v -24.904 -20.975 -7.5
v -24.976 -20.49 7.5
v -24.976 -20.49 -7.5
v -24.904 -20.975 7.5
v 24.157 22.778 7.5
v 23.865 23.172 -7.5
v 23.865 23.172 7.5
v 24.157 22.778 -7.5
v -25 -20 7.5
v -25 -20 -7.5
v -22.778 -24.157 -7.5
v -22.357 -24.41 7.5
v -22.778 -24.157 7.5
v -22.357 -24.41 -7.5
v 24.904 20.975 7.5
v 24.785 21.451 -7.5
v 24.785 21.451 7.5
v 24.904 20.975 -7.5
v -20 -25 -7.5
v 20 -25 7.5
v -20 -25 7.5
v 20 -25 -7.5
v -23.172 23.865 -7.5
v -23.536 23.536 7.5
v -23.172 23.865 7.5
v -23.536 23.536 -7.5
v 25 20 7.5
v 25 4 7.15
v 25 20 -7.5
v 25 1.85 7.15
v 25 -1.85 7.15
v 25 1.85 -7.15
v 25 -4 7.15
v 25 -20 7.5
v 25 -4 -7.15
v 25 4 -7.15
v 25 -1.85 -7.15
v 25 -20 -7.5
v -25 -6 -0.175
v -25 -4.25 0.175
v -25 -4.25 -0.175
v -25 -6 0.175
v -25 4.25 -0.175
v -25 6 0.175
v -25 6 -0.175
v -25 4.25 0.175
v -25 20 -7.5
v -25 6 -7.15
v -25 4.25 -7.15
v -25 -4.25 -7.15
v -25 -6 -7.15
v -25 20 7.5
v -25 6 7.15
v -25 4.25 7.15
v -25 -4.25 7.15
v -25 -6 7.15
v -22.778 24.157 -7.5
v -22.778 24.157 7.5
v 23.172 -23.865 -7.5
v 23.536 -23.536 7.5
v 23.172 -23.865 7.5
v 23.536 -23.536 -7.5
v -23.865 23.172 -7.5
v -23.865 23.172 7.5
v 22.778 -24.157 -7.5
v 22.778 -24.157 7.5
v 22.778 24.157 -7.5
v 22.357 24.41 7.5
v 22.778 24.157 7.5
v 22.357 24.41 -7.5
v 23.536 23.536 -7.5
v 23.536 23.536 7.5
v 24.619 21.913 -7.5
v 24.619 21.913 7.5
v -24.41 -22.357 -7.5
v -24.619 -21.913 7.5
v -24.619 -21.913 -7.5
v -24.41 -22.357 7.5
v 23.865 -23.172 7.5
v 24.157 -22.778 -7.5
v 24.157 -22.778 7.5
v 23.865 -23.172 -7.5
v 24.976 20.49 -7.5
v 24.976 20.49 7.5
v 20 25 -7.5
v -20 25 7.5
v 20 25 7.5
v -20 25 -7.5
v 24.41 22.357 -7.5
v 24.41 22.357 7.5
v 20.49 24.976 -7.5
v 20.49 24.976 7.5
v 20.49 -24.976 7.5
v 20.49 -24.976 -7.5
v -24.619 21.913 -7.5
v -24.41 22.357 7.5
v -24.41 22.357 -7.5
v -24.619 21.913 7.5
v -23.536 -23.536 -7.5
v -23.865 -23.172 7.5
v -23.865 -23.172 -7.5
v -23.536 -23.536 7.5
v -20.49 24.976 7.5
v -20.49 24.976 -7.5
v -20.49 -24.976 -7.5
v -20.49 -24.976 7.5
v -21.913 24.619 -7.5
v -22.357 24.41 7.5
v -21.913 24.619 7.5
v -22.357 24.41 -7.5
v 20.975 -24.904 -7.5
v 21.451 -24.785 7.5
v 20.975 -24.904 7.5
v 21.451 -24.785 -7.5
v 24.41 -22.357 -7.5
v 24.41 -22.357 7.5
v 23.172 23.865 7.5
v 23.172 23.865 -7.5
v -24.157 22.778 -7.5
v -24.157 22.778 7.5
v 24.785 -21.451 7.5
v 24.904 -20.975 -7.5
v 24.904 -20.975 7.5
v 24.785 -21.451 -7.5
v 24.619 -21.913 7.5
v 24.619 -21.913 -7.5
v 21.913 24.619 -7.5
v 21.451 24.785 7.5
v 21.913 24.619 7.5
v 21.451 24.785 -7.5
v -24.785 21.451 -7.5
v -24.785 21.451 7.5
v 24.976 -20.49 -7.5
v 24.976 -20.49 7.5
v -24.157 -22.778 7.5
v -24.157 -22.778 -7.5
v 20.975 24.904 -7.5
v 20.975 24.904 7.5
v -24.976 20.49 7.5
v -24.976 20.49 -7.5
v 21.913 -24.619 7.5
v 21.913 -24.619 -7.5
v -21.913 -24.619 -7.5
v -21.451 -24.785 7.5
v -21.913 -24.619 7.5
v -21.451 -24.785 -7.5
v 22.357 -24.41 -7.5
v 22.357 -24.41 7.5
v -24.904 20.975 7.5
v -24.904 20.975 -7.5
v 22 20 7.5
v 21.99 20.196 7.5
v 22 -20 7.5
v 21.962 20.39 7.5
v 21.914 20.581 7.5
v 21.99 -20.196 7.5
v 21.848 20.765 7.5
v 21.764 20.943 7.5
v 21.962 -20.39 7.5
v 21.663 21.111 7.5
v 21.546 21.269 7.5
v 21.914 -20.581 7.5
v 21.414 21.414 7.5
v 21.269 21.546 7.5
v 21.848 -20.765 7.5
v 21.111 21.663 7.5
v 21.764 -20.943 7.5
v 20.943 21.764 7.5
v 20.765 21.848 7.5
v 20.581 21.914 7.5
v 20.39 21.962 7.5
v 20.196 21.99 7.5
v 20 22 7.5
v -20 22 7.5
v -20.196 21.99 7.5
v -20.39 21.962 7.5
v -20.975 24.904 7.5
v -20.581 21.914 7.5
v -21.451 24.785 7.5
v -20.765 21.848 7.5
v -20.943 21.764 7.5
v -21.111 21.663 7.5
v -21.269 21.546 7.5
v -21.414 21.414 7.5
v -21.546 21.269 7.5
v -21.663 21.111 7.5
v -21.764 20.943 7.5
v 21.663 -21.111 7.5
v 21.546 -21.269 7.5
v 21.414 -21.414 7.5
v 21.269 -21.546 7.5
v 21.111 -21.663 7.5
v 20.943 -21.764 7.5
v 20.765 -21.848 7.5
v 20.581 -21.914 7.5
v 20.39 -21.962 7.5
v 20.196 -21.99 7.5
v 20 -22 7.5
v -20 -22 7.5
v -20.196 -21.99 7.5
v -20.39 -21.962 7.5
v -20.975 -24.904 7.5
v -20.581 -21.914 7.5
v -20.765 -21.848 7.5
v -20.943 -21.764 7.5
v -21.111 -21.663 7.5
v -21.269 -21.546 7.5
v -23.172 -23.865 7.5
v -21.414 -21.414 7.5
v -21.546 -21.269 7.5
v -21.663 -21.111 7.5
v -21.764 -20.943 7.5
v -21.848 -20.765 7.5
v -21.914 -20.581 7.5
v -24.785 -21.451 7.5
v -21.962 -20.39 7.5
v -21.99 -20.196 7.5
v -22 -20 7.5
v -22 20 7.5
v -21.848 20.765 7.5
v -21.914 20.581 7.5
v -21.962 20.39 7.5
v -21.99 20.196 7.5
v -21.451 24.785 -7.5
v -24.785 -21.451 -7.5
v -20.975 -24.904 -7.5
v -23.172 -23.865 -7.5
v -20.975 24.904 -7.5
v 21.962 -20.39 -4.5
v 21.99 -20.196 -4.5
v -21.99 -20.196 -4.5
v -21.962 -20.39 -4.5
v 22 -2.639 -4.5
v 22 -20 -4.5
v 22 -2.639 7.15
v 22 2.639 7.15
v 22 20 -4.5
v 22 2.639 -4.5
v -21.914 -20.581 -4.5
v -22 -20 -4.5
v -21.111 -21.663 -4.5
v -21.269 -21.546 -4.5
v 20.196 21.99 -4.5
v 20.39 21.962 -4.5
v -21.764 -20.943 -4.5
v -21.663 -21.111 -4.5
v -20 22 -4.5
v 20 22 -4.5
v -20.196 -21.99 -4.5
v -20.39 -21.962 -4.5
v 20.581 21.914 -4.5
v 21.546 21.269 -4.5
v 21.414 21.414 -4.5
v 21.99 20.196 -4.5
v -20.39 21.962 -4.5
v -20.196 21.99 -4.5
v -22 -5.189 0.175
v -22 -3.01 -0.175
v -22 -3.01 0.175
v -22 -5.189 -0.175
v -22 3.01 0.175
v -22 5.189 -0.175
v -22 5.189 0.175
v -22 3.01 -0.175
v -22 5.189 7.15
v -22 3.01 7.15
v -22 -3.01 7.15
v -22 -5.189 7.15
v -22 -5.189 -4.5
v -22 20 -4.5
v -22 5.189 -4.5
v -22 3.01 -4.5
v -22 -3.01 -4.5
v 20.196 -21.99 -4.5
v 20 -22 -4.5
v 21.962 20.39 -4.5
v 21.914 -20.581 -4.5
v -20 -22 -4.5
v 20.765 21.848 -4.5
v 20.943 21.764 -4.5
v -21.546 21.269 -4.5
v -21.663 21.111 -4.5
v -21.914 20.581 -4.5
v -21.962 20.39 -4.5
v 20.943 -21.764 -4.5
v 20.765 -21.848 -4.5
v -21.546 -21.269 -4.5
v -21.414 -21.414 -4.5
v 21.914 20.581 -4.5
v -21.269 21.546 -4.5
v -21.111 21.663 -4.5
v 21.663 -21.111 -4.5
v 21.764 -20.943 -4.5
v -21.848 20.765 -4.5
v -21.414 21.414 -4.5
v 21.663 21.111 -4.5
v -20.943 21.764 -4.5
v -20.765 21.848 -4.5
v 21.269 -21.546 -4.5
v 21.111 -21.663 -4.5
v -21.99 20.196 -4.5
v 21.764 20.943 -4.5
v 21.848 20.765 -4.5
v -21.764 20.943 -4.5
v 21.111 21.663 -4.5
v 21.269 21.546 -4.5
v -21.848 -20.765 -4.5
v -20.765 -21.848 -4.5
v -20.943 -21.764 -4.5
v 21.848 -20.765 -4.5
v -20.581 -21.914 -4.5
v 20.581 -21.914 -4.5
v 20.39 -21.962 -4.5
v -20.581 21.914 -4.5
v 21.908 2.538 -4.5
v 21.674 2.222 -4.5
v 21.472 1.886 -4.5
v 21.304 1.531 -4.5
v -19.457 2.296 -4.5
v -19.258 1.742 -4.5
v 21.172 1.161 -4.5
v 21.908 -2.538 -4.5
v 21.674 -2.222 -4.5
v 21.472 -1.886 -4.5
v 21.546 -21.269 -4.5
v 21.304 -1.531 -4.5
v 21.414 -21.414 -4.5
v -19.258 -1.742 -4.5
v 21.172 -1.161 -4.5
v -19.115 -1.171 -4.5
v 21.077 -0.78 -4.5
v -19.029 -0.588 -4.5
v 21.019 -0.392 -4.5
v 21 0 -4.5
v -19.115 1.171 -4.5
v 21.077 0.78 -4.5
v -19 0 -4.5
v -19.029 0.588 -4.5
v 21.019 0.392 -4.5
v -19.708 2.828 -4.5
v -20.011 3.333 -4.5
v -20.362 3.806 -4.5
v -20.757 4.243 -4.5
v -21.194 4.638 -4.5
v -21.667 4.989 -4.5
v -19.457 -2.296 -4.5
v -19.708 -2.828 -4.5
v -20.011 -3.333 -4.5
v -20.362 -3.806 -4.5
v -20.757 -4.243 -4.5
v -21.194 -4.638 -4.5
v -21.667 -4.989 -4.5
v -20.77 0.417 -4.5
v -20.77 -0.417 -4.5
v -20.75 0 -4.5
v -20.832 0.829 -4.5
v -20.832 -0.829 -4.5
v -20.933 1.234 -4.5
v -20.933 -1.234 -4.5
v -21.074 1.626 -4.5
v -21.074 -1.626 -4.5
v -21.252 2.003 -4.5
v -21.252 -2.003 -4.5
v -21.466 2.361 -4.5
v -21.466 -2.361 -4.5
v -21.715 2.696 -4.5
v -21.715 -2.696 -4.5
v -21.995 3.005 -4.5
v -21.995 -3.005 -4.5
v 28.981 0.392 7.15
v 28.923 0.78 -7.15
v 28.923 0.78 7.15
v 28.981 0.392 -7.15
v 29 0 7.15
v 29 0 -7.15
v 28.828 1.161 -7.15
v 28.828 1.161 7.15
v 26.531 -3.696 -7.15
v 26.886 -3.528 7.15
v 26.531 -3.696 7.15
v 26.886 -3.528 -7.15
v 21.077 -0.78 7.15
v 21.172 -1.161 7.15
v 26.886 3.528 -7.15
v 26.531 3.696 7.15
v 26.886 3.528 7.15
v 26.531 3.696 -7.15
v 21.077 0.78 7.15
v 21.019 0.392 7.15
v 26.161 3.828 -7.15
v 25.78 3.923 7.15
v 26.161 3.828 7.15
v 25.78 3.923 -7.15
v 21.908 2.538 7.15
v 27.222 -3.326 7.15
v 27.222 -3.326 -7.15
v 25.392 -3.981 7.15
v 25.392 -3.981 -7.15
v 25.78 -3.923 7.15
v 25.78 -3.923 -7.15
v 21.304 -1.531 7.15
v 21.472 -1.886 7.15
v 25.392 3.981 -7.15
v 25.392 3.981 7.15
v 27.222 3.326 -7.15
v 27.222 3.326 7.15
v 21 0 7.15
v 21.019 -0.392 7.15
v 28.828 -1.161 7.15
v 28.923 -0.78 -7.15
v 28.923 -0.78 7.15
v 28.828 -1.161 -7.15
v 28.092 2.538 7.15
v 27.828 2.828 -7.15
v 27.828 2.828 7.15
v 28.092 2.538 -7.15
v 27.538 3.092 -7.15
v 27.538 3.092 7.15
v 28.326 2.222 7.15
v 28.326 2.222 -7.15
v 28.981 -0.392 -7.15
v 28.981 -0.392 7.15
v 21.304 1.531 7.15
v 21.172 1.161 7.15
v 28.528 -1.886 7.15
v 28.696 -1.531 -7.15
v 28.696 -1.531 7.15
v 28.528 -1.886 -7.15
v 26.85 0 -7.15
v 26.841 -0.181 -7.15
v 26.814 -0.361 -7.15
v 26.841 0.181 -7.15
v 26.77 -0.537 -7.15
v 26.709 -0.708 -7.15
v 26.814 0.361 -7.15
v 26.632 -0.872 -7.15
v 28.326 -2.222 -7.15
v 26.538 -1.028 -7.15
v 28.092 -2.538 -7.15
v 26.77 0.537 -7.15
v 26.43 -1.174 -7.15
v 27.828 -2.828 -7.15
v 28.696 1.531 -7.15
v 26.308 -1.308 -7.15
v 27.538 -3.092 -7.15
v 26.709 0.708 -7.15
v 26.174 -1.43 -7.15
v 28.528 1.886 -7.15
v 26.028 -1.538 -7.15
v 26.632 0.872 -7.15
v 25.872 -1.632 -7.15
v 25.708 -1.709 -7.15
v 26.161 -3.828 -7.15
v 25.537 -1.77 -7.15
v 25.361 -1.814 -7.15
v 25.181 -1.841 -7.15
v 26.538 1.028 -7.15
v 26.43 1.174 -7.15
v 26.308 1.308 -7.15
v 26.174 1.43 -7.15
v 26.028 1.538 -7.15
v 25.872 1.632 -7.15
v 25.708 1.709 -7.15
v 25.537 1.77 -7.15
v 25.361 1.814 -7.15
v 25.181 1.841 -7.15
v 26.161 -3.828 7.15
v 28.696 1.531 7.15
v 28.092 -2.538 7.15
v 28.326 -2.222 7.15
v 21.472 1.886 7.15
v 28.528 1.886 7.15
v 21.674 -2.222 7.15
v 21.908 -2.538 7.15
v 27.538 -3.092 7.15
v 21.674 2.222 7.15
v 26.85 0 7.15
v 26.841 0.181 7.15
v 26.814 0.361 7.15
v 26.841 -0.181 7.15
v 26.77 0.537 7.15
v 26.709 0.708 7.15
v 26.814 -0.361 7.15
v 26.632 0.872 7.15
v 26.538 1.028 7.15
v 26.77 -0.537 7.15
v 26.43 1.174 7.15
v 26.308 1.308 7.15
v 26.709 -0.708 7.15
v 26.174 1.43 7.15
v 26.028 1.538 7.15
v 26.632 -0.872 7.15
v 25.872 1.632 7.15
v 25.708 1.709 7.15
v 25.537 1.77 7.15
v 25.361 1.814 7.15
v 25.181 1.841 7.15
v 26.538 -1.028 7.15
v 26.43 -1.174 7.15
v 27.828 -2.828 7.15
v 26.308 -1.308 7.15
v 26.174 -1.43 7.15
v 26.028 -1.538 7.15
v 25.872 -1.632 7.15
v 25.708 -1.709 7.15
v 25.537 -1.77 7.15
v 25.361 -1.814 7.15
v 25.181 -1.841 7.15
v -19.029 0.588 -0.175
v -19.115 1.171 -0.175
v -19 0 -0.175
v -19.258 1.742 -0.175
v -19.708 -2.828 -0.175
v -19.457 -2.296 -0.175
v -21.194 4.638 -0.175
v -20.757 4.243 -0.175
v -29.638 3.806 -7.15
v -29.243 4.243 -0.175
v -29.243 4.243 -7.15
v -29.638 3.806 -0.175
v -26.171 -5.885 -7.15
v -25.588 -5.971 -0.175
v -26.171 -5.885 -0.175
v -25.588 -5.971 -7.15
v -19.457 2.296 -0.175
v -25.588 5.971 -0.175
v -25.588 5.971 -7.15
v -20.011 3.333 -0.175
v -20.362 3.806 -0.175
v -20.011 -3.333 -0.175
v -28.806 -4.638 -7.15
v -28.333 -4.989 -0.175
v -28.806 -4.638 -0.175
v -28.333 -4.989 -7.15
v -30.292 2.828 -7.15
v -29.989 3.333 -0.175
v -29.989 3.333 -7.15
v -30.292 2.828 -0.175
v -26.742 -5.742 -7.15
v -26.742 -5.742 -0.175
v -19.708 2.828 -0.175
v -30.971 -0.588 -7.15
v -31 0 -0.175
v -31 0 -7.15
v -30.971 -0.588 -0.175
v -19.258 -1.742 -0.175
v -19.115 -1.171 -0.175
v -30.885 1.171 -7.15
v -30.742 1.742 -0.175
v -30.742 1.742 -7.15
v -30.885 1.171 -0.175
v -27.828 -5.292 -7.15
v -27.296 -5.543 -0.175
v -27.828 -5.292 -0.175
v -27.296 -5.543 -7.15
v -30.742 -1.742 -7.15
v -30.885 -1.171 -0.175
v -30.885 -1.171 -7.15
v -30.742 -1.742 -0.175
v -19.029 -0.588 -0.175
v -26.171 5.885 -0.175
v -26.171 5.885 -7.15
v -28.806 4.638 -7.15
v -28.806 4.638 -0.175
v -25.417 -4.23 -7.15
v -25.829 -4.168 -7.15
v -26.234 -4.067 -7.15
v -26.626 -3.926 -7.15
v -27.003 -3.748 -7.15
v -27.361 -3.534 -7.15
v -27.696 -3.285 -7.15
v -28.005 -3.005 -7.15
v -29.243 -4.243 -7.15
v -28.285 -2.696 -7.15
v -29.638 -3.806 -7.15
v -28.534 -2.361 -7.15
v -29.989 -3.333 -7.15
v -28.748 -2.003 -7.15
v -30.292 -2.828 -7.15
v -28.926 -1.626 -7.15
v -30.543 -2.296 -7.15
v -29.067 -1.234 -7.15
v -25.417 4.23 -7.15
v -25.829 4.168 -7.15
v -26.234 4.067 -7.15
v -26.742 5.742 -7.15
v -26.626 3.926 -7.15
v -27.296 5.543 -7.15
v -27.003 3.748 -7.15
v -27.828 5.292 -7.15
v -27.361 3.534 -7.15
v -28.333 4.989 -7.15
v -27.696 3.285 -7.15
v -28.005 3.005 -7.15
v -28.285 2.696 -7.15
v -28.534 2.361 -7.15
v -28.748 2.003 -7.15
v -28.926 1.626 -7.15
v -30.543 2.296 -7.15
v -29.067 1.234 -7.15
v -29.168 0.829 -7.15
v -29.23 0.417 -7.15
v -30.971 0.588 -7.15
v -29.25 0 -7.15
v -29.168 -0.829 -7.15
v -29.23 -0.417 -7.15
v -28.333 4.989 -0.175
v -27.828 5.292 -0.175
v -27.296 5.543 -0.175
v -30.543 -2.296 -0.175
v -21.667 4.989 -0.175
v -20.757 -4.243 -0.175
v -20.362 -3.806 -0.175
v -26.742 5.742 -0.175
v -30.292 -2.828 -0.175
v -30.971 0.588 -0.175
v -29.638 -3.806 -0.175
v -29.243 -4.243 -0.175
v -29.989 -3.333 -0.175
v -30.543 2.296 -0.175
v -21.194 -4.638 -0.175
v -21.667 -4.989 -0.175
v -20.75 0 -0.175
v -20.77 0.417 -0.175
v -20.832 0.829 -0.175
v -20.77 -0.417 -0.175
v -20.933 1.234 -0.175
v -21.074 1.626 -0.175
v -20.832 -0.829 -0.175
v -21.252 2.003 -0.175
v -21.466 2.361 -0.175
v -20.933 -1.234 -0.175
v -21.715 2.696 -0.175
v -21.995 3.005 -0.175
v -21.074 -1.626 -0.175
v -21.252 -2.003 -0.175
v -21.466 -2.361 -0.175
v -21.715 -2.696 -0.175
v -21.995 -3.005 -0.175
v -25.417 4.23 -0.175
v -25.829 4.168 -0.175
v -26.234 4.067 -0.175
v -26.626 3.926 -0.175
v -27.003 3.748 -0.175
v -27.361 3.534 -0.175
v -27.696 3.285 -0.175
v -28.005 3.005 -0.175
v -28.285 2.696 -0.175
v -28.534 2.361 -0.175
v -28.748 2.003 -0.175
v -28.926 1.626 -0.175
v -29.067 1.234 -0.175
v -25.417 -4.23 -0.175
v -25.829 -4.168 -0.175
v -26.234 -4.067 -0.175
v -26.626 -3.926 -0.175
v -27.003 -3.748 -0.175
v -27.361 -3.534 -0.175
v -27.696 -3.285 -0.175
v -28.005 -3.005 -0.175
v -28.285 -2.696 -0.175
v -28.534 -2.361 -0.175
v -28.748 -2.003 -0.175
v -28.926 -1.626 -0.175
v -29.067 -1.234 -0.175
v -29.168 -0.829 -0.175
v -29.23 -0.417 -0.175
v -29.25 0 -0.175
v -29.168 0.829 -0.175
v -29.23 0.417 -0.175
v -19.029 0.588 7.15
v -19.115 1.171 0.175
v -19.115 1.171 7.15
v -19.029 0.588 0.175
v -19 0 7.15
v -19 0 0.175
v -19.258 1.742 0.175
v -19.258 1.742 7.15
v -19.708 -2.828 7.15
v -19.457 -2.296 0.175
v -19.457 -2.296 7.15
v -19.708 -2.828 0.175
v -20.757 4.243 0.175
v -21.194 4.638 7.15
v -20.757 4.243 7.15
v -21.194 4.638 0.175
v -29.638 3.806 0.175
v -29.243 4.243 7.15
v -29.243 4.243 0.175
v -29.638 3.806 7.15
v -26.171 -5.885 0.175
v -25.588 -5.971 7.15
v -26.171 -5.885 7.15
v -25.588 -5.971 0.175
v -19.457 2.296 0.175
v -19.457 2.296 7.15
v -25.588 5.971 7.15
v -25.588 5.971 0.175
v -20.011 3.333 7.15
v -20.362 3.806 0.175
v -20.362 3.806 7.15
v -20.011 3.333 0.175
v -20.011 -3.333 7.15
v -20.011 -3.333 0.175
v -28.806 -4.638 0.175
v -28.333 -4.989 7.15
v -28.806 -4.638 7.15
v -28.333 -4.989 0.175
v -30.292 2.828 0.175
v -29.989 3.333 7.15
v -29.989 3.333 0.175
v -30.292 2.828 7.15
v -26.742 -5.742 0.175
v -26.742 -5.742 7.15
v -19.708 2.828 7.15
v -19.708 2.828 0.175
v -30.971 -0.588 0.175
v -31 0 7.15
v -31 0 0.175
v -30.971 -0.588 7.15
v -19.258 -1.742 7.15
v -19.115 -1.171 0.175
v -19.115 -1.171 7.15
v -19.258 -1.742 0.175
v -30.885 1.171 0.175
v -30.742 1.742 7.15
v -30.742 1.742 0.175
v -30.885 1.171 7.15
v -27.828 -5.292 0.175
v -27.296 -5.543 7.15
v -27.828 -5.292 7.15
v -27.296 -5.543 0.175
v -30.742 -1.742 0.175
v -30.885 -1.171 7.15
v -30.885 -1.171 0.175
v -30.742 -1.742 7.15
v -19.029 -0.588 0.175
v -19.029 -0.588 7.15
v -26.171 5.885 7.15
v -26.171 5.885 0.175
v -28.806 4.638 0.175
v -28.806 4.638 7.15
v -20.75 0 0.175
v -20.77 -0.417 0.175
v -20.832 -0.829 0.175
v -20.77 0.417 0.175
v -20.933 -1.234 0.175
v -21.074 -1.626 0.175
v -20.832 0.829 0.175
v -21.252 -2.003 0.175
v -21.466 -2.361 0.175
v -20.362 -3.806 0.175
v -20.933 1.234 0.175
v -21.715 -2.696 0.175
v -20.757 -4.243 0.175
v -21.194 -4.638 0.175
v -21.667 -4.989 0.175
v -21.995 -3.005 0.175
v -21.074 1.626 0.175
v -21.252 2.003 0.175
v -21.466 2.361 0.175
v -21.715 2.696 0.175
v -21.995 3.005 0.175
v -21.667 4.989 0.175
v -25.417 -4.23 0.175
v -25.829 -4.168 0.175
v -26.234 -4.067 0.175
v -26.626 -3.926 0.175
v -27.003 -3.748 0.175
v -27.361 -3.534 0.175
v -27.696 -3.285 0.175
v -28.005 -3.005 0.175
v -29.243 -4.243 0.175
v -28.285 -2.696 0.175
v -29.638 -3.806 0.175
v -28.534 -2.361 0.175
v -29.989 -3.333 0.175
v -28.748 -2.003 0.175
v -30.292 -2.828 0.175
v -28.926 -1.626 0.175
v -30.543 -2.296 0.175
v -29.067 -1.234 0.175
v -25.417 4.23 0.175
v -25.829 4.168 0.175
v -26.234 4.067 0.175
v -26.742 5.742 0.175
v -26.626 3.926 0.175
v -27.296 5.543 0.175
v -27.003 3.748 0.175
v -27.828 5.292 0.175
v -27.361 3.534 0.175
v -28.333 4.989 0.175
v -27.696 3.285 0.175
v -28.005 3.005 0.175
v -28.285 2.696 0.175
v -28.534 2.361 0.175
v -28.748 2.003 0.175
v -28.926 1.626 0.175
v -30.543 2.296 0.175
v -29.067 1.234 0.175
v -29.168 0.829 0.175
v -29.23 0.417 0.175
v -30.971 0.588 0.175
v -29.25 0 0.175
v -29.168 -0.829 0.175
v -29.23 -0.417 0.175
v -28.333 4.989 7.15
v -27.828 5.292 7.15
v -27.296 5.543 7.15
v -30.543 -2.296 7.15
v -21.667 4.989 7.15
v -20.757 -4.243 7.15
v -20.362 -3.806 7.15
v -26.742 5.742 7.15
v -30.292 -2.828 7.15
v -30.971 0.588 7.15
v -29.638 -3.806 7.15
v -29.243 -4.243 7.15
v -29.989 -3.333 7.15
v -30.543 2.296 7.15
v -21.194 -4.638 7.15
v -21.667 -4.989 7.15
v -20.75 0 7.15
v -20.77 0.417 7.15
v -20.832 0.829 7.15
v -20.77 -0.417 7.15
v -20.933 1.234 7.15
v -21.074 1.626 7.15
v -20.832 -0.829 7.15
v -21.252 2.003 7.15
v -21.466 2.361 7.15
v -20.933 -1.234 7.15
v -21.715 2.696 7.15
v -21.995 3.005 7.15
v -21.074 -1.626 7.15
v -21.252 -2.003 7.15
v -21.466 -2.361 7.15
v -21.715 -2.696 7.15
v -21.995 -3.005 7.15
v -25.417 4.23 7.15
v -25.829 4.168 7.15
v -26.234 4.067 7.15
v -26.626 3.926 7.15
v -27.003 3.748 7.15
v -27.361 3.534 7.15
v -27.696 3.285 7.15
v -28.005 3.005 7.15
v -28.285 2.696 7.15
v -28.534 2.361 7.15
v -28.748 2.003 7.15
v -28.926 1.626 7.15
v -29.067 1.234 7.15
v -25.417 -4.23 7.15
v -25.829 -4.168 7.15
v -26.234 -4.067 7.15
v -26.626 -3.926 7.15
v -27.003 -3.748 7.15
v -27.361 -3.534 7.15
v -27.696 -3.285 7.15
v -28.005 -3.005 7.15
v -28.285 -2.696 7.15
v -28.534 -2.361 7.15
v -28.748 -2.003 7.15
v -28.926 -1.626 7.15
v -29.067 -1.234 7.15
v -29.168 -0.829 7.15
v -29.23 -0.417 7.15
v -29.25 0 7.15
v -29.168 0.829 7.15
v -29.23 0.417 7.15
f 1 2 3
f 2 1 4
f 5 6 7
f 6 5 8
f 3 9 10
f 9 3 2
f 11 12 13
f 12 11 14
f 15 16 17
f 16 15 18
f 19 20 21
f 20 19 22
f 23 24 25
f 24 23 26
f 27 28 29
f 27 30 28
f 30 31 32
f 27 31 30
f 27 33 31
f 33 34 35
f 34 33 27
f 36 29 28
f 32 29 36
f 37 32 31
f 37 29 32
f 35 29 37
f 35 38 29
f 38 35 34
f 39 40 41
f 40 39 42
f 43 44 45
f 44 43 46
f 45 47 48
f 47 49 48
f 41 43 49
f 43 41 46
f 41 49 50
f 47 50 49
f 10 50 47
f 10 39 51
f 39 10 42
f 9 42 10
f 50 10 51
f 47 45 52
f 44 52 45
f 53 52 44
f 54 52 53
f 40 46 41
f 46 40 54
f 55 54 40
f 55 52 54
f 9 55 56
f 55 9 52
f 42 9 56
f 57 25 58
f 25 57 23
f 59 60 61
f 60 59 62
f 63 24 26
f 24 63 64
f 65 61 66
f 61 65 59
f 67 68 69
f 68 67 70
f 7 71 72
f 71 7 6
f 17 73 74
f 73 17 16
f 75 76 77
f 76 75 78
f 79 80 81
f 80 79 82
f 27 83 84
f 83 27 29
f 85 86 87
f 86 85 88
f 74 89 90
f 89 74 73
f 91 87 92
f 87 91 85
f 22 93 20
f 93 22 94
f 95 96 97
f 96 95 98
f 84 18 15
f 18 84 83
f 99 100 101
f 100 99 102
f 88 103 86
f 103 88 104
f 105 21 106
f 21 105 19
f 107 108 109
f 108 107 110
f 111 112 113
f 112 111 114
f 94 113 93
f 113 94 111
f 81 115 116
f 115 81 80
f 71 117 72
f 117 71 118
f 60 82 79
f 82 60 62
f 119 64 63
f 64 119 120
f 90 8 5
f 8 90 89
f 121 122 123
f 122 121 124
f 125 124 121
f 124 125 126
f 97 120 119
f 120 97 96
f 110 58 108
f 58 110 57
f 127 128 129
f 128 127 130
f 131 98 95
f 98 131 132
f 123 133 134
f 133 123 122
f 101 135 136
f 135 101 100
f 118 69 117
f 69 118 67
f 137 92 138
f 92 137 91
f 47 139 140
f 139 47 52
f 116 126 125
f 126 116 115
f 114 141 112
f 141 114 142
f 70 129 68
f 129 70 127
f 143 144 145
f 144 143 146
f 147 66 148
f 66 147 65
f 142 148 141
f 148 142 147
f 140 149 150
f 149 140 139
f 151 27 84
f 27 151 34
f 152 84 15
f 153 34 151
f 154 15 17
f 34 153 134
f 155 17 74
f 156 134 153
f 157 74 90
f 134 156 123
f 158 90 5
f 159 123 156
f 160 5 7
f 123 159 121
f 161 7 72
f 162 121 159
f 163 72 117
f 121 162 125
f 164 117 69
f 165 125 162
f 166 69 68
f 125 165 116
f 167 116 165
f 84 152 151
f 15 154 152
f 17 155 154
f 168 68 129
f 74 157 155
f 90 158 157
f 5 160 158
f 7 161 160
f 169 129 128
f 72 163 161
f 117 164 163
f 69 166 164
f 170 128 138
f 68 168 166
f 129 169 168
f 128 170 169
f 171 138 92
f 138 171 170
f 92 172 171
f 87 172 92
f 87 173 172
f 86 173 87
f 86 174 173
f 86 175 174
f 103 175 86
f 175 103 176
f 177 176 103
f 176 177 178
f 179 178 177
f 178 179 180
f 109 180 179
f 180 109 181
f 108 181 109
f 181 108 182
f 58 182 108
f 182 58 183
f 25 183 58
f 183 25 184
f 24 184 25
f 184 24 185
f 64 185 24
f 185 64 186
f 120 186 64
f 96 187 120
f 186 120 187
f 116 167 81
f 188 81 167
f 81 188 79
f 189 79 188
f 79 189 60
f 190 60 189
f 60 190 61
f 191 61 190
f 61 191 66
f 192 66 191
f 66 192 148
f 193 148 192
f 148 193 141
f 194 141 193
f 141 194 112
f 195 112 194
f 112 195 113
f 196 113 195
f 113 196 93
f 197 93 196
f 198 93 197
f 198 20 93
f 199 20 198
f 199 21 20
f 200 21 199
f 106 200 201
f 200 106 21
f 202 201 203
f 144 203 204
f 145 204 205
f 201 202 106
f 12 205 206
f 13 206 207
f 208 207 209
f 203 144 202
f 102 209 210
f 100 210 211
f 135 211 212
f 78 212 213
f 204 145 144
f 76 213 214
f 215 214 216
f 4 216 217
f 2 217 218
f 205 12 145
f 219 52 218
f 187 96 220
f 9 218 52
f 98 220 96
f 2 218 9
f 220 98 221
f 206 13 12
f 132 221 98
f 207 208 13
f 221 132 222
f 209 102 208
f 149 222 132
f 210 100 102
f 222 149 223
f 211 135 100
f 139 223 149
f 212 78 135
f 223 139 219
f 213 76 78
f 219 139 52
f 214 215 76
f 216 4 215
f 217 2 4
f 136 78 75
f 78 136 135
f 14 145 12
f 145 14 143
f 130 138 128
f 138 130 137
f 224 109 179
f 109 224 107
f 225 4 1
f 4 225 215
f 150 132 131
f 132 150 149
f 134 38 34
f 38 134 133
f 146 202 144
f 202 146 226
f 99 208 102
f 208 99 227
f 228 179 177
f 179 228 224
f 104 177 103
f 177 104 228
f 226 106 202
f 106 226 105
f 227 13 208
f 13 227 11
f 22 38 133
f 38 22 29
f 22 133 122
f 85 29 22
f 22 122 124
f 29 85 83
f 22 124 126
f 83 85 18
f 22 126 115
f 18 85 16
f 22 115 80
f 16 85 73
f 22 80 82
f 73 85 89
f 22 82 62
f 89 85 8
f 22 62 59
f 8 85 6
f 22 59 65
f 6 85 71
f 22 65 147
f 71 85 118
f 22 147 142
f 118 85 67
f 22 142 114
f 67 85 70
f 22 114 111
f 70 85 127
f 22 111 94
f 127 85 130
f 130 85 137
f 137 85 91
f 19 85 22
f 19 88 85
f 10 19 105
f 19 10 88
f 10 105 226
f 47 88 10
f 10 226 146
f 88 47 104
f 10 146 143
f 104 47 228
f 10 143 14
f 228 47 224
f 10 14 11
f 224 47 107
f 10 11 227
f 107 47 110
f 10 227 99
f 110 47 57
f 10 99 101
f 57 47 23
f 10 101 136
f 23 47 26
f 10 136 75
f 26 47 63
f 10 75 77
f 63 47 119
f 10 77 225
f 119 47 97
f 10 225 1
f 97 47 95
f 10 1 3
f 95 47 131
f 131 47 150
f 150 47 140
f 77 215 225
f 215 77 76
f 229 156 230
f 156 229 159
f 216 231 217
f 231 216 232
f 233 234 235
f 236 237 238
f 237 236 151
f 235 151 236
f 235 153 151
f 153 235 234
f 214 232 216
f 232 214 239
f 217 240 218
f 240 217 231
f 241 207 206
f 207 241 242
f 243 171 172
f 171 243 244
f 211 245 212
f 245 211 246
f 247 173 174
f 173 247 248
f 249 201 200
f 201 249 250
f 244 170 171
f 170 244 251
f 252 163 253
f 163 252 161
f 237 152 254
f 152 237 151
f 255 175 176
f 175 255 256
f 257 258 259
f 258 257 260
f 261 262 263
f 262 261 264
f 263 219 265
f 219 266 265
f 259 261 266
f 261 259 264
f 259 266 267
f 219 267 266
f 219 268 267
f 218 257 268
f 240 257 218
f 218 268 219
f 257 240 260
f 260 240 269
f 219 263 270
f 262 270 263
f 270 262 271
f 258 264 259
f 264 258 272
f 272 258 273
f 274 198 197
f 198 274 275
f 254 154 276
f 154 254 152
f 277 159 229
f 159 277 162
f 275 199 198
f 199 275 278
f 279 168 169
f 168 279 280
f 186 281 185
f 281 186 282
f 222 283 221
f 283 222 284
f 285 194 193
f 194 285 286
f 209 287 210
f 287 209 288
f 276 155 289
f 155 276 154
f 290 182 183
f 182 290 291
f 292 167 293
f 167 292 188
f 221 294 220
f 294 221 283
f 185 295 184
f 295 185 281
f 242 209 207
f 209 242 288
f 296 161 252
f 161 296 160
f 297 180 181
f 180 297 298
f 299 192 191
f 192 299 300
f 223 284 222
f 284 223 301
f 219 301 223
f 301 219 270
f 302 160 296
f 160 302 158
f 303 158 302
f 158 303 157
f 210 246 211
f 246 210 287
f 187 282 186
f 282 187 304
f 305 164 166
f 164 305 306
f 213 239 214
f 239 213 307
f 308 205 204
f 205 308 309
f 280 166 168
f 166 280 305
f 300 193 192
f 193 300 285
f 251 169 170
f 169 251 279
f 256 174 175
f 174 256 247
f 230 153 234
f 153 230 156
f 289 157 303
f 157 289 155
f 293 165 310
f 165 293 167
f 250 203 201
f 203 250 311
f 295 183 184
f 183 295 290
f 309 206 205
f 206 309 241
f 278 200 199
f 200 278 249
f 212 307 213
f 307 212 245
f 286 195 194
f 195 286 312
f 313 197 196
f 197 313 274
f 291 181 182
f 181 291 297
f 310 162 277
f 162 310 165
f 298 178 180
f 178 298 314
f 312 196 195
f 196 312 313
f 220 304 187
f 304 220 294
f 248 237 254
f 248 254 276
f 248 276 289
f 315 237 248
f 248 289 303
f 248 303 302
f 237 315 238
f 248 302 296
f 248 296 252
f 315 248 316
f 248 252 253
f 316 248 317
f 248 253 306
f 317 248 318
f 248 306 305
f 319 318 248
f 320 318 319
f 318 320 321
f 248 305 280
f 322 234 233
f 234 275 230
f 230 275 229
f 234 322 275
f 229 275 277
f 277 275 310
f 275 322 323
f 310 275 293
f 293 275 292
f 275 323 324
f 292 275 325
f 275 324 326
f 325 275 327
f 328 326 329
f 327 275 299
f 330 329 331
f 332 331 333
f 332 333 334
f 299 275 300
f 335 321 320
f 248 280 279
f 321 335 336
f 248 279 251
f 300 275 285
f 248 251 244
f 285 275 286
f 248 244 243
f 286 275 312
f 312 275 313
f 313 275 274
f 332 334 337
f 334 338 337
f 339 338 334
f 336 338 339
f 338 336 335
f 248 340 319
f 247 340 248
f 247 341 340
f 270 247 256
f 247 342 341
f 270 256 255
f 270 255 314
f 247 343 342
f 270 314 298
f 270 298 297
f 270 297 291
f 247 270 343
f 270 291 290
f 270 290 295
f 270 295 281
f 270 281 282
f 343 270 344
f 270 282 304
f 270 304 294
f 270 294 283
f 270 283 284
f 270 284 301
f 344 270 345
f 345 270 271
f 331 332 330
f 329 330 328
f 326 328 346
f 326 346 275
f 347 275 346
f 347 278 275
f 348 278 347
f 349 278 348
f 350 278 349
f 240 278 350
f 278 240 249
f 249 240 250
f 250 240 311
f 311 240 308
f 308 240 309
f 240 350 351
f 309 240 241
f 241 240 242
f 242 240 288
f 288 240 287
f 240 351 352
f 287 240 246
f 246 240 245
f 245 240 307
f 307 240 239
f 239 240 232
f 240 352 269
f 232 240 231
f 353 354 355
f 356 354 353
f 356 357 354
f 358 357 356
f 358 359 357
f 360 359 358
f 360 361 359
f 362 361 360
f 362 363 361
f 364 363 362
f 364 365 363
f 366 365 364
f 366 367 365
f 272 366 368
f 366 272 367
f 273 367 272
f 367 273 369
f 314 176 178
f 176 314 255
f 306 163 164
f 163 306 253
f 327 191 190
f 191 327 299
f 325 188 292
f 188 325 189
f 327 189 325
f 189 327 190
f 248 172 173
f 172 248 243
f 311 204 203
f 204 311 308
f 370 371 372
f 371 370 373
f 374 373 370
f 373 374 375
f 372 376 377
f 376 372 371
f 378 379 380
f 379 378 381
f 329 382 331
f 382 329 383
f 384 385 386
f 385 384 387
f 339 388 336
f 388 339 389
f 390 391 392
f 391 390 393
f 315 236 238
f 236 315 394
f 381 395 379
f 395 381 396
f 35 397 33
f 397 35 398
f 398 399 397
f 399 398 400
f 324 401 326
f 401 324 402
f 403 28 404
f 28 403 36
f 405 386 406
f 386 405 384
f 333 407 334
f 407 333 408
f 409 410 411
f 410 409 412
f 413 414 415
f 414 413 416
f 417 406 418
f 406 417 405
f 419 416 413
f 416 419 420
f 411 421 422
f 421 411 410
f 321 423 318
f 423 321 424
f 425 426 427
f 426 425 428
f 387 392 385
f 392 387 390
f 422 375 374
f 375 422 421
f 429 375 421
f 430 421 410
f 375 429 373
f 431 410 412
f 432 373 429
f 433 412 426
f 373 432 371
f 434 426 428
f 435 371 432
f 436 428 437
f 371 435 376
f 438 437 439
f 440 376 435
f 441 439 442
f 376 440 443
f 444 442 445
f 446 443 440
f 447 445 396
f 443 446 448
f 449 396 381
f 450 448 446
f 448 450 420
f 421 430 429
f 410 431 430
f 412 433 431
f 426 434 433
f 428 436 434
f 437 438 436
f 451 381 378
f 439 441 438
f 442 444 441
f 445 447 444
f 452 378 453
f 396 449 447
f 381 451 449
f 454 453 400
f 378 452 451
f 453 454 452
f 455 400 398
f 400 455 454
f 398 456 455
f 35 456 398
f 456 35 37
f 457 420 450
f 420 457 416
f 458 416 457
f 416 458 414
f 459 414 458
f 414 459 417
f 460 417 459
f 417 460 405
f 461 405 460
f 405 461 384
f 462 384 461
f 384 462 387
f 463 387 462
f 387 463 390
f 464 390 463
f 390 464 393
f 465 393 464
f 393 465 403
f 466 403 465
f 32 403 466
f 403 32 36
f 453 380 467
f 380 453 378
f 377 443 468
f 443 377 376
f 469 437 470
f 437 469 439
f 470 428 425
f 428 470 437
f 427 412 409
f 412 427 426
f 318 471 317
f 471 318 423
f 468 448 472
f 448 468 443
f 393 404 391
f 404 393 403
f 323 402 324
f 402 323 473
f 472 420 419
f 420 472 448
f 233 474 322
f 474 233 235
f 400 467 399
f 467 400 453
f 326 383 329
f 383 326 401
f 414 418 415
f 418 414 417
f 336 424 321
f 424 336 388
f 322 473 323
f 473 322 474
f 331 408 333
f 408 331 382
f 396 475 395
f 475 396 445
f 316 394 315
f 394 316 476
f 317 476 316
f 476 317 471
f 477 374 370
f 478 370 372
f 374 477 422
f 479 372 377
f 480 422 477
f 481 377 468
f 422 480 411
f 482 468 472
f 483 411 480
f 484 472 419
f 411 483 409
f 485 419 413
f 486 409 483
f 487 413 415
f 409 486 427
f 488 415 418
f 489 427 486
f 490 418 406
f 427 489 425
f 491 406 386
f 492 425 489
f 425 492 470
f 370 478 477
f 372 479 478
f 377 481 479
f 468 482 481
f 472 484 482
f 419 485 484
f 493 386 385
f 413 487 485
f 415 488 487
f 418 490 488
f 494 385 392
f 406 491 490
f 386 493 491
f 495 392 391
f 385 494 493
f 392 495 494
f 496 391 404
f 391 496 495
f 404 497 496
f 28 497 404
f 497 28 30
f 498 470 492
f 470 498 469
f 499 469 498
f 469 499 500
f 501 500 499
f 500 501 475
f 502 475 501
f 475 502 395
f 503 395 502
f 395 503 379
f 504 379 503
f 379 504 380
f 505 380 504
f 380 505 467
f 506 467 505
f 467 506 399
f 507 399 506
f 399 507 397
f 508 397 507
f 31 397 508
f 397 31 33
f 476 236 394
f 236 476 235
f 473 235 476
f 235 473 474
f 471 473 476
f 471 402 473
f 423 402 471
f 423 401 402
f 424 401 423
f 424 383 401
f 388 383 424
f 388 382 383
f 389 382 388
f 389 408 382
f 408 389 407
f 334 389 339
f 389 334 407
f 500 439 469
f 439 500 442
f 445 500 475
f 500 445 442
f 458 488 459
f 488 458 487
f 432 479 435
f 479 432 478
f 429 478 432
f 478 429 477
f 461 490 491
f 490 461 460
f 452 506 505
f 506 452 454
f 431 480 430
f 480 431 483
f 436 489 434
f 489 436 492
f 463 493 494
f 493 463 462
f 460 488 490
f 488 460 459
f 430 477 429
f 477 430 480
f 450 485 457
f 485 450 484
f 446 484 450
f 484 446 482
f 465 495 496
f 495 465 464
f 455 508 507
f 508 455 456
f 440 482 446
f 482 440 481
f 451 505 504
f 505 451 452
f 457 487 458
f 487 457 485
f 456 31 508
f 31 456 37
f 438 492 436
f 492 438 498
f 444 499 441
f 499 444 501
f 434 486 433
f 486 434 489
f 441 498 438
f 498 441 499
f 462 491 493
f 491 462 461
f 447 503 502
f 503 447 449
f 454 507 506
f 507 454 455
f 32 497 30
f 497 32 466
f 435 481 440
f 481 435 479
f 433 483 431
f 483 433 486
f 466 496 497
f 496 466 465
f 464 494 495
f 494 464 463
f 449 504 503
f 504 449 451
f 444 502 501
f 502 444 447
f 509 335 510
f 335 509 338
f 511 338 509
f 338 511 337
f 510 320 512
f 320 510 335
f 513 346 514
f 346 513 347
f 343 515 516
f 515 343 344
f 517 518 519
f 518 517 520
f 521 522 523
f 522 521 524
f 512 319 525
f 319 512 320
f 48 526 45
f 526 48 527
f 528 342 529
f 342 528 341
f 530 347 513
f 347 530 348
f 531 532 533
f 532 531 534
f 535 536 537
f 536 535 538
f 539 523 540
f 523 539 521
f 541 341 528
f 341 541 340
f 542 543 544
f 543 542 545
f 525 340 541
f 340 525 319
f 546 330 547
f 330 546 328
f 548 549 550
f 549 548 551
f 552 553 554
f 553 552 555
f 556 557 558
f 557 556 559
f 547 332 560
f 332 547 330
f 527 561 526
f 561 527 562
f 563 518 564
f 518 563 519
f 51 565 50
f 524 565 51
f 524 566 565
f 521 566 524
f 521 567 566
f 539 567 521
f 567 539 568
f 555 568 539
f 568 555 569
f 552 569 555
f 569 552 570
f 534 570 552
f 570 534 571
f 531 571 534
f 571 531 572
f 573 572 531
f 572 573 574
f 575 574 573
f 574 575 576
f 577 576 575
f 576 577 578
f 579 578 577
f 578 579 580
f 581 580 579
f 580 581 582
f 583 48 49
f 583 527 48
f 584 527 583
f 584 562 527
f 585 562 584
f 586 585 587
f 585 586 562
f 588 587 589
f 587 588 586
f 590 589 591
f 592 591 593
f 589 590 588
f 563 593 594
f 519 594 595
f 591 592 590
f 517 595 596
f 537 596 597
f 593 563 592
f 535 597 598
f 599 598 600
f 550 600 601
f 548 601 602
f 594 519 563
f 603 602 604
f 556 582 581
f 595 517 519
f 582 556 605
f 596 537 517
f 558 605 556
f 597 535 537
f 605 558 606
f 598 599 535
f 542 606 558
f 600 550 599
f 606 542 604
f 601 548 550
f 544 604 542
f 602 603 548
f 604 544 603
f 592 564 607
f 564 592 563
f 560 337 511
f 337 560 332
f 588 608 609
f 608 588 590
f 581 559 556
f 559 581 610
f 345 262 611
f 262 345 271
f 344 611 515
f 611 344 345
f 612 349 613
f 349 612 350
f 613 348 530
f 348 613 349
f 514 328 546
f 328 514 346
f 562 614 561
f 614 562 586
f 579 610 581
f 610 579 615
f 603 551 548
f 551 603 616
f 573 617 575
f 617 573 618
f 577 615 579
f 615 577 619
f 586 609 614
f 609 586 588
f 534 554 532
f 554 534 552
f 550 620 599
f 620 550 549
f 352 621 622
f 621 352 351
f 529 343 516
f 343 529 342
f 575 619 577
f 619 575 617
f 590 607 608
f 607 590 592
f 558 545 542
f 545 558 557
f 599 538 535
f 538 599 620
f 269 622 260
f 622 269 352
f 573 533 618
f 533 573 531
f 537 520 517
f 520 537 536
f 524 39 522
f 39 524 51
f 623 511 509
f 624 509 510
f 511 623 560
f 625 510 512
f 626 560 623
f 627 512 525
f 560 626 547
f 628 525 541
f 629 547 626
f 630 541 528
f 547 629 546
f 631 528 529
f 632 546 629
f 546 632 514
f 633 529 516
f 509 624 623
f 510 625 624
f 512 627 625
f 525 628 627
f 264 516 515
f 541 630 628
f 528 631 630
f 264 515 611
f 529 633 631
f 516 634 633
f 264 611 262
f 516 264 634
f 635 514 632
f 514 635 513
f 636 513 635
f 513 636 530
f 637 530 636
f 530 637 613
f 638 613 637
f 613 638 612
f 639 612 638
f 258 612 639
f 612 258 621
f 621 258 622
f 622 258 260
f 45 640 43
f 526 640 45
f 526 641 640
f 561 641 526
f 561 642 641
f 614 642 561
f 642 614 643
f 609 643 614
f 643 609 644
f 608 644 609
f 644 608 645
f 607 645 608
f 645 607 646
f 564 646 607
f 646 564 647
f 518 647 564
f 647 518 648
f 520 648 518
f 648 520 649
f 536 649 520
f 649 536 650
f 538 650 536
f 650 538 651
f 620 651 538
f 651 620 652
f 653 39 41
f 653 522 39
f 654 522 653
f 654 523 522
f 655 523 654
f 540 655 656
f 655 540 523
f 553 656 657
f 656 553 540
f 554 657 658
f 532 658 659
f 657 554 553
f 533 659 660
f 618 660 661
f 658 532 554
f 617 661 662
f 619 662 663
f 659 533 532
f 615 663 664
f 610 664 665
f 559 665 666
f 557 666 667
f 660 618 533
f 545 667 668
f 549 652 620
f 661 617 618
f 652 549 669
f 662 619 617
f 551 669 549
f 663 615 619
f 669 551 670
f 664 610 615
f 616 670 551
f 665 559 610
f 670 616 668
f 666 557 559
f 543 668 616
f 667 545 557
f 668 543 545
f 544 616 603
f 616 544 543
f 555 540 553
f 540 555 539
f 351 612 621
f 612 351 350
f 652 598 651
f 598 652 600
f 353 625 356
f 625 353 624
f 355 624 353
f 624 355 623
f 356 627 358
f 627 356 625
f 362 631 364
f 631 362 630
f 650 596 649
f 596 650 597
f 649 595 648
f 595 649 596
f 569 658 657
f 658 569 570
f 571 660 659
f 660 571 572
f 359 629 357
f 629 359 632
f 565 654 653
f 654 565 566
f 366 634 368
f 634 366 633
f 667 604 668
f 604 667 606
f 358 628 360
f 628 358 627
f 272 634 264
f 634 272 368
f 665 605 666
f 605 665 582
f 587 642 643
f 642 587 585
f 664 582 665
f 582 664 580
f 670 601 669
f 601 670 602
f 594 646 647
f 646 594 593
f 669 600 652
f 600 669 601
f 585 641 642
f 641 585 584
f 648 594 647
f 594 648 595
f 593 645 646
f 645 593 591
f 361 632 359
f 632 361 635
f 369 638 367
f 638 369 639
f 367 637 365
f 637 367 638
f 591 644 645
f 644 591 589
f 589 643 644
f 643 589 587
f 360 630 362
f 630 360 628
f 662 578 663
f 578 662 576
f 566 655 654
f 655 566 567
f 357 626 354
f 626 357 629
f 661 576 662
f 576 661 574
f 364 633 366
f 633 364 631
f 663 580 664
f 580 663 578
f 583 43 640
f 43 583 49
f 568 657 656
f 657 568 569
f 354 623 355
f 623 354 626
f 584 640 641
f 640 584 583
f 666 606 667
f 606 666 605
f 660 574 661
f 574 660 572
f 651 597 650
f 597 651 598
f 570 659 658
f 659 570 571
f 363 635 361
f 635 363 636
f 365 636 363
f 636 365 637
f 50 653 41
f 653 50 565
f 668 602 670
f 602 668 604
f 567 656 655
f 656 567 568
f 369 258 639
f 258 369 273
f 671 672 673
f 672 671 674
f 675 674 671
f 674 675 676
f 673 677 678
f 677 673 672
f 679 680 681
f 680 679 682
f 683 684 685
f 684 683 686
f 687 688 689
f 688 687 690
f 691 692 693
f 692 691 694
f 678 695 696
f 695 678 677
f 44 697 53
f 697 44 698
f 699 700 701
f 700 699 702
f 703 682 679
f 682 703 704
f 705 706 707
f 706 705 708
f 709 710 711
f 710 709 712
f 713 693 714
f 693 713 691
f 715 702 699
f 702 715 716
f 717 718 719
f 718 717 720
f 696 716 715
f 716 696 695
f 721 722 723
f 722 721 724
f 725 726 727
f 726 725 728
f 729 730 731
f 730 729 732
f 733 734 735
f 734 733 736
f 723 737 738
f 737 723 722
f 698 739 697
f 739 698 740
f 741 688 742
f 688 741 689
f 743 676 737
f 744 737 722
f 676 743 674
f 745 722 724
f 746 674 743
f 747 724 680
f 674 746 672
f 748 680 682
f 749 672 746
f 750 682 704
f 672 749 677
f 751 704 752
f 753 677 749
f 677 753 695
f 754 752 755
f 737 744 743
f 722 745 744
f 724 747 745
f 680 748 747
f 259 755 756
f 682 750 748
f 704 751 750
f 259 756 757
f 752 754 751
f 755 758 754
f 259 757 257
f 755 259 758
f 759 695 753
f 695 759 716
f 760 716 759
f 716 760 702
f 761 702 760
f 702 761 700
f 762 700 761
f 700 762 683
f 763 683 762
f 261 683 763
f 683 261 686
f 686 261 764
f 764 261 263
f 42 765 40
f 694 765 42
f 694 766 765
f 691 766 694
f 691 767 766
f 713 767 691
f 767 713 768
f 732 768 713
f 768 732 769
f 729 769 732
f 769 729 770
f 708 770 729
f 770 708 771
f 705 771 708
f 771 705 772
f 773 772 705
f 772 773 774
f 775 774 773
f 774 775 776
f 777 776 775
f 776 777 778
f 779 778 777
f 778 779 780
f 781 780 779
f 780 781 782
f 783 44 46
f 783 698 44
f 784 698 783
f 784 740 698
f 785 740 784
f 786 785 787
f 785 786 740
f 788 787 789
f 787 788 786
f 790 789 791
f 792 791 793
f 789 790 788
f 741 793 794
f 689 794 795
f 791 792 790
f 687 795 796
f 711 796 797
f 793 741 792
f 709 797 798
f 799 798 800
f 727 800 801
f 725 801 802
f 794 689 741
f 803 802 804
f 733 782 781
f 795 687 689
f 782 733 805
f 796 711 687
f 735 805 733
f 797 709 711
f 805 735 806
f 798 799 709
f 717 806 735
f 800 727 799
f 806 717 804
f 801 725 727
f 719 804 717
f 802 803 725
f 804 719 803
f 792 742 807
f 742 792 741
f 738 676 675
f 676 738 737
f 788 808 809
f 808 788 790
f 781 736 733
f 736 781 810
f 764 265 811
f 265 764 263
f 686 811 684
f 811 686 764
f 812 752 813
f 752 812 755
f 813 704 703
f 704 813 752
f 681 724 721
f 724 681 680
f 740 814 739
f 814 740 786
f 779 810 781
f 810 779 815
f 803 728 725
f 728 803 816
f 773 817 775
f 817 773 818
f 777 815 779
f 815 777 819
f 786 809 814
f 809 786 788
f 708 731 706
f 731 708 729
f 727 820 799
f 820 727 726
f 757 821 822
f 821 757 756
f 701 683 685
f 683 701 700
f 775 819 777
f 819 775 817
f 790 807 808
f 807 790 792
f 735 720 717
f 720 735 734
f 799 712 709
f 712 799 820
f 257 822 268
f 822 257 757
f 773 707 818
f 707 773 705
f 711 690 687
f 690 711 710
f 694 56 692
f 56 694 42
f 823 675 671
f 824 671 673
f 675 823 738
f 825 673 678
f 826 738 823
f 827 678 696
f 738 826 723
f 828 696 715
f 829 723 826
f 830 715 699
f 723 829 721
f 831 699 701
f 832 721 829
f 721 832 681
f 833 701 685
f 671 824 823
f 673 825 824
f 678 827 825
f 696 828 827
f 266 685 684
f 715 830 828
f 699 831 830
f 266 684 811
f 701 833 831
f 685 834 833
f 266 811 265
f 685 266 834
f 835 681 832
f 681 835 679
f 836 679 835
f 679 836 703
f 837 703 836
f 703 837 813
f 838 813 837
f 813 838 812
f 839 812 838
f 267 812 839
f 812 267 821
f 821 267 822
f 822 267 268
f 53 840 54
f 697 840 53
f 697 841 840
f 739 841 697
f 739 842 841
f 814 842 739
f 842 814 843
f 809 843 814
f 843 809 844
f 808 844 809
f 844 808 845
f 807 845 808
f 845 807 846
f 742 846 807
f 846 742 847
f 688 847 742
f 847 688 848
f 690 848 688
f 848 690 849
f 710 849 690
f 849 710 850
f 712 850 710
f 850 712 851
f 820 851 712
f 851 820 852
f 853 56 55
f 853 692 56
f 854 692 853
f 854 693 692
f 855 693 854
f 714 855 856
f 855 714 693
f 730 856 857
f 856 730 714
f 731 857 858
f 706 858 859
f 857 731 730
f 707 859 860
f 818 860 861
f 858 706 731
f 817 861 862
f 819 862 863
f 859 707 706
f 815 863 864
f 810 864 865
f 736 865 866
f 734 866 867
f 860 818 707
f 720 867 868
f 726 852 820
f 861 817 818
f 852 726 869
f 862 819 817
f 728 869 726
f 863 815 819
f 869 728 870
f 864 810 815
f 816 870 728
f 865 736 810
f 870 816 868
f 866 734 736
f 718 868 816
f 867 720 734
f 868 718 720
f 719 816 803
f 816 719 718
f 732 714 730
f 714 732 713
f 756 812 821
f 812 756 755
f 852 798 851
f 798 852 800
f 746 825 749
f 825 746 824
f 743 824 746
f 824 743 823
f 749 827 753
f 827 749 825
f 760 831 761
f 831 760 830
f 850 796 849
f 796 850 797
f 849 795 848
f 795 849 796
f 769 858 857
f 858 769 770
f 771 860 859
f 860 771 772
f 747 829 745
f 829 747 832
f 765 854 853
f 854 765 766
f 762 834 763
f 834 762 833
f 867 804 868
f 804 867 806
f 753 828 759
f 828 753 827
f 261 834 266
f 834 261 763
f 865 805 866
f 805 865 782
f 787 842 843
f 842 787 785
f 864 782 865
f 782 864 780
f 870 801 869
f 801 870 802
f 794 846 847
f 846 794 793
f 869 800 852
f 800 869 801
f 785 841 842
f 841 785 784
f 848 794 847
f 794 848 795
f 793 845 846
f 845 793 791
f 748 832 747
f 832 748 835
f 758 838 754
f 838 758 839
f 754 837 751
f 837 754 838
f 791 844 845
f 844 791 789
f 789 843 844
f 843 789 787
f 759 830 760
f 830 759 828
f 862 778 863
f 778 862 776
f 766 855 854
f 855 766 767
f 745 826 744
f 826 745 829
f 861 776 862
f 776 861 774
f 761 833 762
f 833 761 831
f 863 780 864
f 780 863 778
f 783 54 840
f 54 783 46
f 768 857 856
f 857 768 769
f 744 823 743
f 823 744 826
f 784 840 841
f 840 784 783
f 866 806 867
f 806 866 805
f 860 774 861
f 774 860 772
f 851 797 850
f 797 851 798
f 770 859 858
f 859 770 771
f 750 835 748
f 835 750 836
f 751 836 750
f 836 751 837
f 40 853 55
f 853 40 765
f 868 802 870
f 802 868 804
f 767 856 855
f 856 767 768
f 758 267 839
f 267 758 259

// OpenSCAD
// Atomic design reference box
// Dimensions: 50 mm x 50 mm x 15 mm

width = 50;
depth = 50;
height = 15;
corner_radius = 5;
wall_thickness = 3;
bottom_thickness = 3;
hinge_outer_radius = 4;
hinge_female_outer_radius = 6;
hinge_pin_radius = 1.6;
hinge_clearance = 0.25;
hinge_gap = 0.35;
resolution = 64;

$fn = resolution;

// A rounded footprint extruded through the full height keeps the rim and
// bottom flat while leaving sturdy rounded vertical corners.
module rounded_footprint(footprint_width, footprint_depth, footprint_radius) {
	hull() {
		for (x = [footprint_radius, footprint_width - footprint_radius]) {
			for (y = [footprint_radius, footprint_depth - footprint_radius]) {
				translate([x, y]) {
					circle(r = footprint_radius);
				}
			}
		}
	}
}

module panel_shell() {
	translate([-width / 2, -depth / 2, -height / 2]) {
		difference() {
			linear_extrude(height = height) {
				rounded_footprint(width, depth, corner_radius);
			}

			translate([wall_thickness, wall_thickness, bottom_thickness]) {
				linear_extrude(height = height - bottom_thickness + 0.1) {
					rounded_footprint(
						width - 2 * wall_thickness,
						depth - 2 * wall_thickness,
						corner_radius - wall_thickness
					);
				}
			}
		}
	}
}

// Panels join edge-to-edge while their flat bottom surfaces rest on a plane.
// The vertical pin hinge lets each neighboring panel rotate in that plane,
// so the assembly can remain flat or form angled shapes.
// Each panel has a male hinge knuckle on the right edge and two female
// knuckles on the left edge. Identical panels join with a vertical pin.
module male_hinge() {
	translate([width / 2, 0, -height / 2 + hinge_gap]) {
		difference() {
			cylinder(
				r = hinge_outer_radius,
				h = height - 2 * hinge_gap
			);
			cylinder(
				r = hinge_pin_radius + hinge_clearance,
				h = height - 2 * hinge_gap + 0.2
			);
		}
	}
}

module female_knuckle(z_position, knuckle_height) {
	translate([-width / 2, 0, z_position]) {
		difference() {
			cylinder(r = hinge_female_outer_radius, h = knuckle_height);
			cylinder(
				r = hinge_outer_radius + hinge_clearance,
				h = knuckle_height + 0.2
			);
		}
	}
}

module female_hinge() {
	knuckle_height = (height - 3 * hinge_gap) / 2;
	female_knuckle(-height / 2 + hinge_gap, knuckle_height);
	female_knuckle(height / 2 - hinge_gap - knuckle_height, knuckle_height);
}

module atomic_design_panel() {
	panel_shell();
	male_hinge();
	female_hinge();
}

atomic_design_panel();
